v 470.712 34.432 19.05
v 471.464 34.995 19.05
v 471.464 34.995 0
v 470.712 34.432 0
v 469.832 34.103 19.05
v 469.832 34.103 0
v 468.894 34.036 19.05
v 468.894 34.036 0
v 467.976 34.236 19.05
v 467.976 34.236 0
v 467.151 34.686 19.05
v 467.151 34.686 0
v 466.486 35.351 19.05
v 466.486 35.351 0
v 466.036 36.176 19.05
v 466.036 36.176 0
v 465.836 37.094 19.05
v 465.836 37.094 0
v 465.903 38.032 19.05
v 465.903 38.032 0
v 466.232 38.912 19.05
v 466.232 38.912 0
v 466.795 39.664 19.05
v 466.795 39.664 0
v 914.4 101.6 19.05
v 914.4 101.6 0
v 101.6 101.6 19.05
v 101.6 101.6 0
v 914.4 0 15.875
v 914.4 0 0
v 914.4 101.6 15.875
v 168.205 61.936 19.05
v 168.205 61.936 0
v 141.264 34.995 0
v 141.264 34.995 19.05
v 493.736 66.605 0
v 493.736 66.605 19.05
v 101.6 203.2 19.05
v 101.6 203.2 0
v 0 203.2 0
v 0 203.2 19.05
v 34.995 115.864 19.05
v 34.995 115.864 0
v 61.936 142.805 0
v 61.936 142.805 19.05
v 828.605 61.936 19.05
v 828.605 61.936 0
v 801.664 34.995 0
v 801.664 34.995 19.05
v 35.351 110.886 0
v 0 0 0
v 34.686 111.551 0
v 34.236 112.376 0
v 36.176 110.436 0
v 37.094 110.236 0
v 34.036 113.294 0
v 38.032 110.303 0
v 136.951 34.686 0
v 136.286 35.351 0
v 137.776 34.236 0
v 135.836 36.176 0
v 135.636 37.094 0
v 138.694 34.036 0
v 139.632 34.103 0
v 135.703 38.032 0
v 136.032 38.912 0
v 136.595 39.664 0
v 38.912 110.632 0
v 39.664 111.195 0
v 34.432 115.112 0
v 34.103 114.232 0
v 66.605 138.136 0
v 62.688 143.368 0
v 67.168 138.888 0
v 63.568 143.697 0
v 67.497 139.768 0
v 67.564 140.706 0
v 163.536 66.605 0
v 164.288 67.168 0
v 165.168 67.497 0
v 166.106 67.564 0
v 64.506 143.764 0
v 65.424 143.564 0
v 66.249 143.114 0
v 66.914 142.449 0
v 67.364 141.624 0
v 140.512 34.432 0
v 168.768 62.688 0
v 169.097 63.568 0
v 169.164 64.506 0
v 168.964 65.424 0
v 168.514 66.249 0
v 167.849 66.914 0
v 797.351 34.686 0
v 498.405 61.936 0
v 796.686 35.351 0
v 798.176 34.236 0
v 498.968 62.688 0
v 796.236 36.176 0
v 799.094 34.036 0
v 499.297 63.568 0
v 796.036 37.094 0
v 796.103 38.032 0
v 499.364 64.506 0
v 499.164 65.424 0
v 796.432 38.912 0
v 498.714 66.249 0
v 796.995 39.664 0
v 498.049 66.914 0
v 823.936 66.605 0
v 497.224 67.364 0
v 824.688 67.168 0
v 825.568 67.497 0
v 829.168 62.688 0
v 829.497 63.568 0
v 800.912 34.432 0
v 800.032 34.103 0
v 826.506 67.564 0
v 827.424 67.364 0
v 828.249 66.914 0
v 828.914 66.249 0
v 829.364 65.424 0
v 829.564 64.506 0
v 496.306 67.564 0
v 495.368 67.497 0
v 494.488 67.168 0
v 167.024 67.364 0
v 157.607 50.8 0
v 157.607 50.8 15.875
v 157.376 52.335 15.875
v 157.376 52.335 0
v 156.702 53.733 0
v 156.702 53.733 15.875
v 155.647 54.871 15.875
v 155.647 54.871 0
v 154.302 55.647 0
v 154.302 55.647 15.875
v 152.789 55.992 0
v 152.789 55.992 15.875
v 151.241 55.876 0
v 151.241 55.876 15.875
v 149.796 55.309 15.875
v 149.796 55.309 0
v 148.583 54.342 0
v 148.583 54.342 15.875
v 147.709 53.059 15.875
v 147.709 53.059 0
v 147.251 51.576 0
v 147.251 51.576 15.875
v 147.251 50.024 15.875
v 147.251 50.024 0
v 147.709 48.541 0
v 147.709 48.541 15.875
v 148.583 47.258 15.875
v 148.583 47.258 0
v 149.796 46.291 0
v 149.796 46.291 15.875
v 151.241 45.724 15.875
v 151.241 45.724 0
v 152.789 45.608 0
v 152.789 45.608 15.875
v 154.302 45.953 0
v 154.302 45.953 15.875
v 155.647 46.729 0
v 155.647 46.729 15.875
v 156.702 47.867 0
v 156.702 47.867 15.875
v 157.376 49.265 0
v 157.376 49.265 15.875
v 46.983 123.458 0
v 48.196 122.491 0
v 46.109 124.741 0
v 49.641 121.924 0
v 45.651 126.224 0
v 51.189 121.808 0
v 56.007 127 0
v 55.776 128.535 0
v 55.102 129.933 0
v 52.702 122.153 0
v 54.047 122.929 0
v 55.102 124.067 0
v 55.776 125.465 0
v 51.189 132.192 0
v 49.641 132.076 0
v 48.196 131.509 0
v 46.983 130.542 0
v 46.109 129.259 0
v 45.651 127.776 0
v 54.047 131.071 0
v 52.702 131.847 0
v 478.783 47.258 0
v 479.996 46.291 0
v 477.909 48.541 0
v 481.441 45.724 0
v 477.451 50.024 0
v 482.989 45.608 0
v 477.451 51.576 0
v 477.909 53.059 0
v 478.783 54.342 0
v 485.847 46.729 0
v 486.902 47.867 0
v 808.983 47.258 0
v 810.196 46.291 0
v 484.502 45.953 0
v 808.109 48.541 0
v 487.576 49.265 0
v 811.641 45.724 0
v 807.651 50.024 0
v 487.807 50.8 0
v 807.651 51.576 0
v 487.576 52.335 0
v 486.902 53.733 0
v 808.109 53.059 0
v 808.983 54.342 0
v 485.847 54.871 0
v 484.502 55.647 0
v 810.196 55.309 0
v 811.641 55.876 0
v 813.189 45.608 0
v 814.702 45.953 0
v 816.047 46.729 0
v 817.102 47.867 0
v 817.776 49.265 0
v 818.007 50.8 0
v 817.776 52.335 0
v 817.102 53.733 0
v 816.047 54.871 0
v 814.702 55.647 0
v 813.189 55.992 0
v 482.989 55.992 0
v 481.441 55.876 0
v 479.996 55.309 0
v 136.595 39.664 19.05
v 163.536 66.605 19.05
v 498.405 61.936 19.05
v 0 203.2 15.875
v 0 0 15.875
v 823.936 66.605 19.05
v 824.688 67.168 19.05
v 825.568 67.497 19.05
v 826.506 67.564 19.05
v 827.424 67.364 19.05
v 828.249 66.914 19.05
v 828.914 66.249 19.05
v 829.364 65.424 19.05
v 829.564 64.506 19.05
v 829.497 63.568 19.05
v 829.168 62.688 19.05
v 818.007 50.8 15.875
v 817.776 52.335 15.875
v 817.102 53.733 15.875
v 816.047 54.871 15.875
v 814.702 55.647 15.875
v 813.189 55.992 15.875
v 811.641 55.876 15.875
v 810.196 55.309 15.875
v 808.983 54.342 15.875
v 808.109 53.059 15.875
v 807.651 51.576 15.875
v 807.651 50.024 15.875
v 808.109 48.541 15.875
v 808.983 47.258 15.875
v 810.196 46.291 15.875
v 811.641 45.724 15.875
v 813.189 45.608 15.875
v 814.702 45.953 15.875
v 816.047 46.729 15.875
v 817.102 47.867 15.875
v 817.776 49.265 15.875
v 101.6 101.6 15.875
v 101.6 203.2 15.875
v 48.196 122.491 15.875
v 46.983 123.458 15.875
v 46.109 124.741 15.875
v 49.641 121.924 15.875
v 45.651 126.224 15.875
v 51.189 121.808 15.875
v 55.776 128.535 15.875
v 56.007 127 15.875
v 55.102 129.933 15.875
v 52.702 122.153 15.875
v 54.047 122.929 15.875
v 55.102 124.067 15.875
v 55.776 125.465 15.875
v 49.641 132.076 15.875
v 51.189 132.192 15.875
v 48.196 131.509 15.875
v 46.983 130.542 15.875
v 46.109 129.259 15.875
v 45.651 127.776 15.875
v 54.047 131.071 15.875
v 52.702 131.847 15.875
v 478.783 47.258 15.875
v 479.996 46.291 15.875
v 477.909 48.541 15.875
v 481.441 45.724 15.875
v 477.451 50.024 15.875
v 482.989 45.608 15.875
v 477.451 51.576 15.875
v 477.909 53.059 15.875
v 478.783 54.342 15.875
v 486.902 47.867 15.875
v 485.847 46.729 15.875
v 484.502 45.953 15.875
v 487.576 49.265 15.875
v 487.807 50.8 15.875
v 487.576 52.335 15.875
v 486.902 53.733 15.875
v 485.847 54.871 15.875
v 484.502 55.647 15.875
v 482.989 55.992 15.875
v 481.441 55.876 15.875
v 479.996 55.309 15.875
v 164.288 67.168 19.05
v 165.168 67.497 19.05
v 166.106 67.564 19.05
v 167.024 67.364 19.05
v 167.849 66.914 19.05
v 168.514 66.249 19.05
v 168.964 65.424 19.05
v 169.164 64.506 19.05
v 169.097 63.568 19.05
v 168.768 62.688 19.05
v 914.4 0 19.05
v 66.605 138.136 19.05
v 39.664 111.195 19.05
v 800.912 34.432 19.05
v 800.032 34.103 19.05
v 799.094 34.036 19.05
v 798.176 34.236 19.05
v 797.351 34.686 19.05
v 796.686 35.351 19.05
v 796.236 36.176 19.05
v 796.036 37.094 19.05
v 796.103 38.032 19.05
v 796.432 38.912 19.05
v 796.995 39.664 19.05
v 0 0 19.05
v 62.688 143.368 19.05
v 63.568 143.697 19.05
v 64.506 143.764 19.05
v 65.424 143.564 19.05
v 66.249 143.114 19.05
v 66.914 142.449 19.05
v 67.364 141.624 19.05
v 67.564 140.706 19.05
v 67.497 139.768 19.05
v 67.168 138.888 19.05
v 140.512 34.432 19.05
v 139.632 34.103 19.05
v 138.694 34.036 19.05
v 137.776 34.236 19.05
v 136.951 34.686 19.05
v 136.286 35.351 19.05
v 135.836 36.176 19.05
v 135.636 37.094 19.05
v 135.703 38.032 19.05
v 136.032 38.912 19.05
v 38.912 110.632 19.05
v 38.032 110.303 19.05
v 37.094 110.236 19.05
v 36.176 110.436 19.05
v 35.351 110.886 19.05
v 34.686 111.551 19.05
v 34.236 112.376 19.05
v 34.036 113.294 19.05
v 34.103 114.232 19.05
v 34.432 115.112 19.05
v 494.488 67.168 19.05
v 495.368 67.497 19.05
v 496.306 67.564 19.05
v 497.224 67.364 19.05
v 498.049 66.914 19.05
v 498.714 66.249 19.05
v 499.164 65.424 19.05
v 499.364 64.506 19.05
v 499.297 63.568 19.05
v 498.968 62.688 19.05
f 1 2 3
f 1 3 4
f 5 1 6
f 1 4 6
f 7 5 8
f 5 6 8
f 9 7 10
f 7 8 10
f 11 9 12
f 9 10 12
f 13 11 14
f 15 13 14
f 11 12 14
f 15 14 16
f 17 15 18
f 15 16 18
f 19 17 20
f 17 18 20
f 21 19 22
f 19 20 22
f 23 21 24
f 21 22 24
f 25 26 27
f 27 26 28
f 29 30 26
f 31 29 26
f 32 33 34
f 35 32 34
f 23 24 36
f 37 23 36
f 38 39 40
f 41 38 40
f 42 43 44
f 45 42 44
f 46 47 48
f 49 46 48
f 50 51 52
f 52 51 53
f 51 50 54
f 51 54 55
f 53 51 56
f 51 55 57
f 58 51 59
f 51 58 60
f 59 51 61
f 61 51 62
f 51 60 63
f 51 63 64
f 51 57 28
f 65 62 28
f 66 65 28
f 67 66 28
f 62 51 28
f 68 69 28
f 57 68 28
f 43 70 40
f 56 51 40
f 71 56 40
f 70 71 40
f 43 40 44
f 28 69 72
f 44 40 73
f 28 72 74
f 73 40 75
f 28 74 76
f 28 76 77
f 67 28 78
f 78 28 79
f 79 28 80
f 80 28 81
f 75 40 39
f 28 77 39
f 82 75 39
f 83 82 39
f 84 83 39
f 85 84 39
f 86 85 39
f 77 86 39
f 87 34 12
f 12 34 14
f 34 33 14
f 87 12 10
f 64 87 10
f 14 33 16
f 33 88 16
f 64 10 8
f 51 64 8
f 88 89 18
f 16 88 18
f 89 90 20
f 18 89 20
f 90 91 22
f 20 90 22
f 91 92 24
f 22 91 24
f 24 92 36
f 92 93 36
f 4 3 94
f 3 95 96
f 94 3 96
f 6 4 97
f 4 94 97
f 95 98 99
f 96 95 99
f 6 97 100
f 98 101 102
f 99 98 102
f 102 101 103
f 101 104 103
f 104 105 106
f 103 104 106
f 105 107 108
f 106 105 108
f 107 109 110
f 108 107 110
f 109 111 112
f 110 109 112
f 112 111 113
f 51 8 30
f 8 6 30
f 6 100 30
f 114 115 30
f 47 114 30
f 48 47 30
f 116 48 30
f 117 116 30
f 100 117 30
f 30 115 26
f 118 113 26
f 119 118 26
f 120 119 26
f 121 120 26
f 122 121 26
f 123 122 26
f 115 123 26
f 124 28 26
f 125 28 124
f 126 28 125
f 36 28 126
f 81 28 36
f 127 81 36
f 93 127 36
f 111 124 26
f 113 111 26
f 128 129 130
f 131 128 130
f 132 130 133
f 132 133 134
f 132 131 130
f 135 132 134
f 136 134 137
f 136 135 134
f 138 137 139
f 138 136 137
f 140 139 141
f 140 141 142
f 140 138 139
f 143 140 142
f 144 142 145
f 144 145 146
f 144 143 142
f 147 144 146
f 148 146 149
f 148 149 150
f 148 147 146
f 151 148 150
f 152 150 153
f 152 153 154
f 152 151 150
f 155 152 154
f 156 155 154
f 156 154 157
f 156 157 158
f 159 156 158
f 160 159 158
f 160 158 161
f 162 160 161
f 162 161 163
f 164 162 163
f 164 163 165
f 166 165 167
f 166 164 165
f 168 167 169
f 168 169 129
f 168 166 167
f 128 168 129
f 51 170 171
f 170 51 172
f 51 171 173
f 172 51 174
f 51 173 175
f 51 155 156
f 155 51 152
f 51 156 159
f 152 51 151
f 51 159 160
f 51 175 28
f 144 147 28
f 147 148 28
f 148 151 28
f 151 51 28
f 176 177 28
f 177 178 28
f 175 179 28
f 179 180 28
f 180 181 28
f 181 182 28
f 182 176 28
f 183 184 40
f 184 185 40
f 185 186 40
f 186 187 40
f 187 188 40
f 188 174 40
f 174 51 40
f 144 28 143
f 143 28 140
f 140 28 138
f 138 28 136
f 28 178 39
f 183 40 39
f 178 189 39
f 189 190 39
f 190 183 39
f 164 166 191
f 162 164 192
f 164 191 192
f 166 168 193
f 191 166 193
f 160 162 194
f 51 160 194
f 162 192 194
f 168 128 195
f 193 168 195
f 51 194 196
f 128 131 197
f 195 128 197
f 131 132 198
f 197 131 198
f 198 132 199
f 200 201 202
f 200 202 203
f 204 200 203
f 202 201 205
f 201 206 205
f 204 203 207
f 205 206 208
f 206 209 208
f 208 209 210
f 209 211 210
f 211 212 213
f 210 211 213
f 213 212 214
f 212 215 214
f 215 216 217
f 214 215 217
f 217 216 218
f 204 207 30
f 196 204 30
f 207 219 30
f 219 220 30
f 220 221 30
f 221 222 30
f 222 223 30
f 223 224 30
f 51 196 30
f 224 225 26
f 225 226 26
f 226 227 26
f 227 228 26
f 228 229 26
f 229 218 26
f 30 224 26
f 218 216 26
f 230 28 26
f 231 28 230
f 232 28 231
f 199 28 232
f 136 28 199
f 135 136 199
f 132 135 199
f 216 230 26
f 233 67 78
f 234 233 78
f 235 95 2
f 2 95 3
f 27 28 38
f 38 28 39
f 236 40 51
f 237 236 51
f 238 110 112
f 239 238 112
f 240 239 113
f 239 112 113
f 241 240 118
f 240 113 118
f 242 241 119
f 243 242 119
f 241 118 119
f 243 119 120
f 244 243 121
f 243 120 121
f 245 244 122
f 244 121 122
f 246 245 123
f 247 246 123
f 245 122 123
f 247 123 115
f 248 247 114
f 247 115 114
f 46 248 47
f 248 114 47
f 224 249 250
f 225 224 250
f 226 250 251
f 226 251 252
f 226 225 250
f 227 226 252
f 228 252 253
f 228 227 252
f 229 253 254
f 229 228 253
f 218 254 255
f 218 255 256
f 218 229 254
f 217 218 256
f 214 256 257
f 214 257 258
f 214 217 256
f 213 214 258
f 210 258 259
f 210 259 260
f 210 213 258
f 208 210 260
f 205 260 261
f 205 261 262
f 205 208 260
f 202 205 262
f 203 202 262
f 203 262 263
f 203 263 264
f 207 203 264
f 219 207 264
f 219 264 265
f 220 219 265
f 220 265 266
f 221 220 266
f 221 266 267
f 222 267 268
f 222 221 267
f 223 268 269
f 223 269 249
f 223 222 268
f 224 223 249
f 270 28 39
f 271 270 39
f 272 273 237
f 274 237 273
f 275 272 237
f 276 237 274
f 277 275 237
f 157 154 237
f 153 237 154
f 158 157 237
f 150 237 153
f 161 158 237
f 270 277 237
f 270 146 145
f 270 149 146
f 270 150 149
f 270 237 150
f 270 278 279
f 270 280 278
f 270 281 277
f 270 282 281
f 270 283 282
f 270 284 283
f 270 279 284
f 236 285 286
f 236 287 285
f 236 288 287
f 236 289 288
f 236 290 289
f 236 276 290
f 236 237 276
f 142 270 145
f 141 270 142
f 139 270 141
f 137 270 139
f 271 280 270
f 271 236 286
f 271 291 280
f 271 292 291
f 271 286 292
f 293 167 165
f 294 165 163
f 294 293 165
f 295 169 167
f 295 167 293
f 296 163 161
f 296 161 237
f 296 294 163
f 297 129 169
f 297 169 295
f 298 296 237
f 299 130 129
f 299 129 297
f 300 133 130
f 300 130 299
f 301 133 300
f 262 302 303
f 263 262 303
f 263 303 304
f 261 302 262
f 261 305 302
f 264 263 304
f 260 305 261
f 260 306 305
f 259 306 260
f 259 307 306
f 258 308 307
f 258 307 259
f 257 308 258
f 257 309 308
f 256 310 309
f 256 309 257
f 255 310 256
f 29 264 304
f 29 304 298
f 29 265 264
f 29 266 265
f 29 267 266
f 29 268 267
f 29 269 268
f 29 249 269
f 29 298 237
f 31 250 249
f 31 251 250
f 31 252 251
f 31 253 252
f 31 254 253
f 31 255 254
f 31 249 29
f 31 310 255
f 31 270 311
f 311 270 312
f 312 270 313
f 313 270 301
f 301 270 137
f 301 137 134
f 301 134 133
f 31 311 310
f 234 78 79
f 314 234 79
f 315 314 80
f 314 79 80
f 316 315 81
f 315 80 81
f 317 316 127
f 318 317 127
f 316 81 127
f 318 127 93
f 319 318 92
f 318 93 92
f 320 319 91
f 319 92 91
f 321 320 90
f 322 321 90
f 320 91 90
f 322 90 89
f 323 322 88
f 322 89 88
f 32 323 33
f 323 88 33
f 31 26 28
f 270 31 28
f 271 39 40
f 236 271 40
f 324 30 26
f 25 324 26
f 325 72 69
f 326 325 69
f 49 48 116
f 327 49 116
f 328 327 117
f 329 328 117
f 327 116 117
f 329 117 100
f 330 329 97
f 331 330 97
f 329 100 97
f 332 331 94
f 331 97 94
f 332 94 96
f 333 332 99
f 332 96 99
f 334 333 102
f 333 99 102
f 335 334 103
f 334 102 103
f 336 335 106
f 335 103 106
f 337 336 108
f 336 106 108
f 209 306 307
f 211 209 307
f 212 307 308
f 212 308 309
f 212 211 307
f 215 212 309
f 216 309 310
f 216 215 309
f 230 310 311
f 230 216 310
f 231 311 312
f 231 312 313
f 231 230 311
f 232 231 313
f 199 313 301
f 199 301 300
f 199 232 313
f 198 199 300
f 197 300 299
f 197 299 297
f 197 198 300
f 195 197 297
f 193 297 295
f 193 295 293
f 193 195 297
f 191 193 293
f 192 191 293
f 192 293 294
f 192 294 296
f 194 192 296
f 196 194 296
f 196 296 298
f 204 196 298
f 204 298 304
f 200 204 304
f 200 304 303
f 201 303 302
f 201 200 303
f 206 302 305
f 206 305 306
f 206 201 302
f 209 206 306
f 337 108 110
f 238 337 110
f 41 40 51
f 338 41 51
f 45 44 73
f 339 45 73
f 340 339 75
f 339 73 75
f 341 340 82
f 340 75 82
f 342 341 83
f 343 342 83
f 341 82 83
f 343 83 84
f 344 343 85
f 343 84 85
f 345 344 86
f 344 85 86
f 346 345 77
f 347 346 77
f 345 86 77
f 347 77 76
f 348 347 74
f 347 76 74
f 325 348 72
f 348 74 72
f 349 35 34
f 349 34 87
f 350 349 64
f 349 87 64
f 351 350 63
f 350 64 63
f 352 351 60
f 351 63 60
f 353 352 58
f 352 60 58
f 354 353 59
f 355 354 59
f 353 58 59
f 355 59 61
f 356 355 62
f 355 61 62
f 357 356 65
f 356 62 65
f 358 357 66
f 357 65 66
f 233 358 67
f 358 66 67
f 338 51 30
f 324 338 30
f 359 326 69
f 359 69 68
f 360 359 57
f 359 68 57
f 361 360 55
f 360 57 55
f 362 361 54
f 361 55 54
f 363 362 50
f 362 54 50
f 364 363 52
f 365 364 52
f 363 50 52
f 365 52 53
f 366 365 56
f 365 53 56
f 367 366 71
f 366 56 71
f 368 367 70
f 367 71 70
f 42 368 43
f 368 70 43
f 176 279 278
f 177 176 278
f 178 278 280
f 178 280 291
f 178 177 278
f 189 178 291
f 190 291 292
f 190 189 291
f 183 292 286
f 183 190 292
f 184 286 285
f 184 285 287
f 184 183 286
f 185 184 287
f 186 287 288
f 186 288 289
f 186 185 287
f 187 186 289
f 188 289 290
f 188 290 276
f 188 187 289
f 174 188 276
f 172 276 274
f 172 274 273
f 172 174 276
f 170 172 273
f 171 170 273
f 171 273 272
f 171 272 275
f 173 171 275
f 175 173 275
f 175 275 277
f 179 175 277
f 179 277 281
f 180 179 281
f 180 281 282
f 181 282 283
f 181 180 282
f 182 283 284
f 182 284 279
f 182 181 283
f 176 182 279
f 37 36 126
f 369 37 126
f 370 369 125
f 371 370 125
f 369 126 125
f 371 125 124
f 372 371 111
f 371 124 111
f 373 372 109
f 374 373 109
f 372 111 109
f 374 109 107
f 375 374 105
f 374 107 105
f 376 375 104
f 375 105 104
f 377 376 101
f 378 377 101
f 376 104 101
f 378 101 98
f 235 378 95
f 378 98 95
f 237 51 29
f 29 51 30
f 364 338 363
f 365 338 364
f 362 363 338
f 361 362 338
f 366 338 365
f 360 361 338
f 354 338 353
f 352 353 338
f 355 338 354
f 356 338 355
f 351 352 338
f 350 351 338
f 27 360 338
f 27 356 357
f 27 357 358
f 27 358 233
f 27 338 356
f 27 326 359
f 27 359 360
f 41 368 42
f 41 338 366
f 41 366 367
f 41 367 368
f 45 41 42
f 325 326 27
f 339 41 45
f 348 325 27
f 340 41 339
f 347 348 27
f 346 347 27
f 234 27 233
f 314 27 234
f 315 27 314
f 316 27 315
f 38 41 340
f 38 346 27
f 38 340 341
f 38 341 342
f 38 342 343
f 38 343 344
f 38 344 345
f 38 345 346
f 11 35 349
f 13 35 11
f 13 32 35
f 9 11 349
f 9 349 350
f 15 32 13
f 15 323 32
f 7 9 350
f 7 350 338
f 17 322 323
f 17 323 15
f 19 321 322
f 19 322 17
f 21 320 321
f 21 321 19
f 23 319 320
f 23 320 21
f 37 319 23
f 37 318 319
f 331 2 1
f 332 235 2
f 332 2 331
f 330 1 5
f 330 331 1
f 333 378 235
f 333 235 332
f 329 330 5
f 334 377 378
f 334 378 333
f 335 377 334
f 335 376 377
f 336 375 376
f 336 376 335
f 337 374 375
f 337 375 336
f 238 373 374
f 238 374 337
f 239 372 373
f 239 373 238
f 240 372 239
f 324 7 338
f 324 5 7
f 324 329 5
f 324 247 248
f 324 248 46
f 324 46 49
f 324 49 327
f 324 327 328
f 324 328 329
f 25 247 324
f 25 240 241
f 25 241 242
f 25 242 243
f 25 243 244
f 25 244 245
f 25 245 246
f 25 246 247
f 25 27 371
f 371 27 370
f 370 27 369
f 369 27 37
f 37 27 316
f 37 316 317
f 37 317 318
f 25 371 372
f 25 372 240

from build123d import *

# Parameters (mm, degrees)
F2_DEPTH = 19.05
F0_R     = 5.207
F3_DEPTH = 15.875


# Not quite as in the source:
# - a length typed as a fraction of an inch, garbled in the dataset ("3 / 203.2 mm" for 3/8 in), is restored


with BuildPart() as f2:
    # F1 (on face) → F2 (new body)
    with BuildSketch(Plane.XY):
        Polygon((101.6, 203.2), (0, 203.2), (0, 0), (914.4, 0), (914.4, 101.6), (101.6, 101.6), align=None)
        with BuildLine():
            Line((168.2052507731, 61.9355175901), (141.2644824099, 34.9947492269))
            ThreePointArc((141.2644824099, 34.9947492269), (136.5947492269, 34.9947492269), (136.5947492269, 39.6644824099))
            Line((136.5947492269, 39.6644824099), (163.5355175901, 66.6052507731))
            ThreePointArc((163.5355175901, 66.6052507731), (168.2052507731, 66.6052507731), (168.2052507731, 61.9355175901))
        make_face(mode=Mode.SUBTRACT)
        with BuildLine():
            Line((498.4052507731, 61.9355175901), (471.4644824099, 34.9947492269))
            ThreePointArc((471.4644824099, 34.9947492269), (466.7947492269, 34.9947492269), (466.7947492269, 39.6644824099))
            Line((466.7947492269, 39.6644824099), (493.7355175901, 66.6052507731))
            ThreePointArc((493.7355175901, 66.6052507731), (498.4052507731, 66.6052507731), (498.4052507731, 61.9355175901))
        make_face(mode=Mode.SUBTRACT)
        with BuildLine():
            Line((828.6052507731, 61.9355175901), (801.6644824099, 34.9947492269))
            ThreePointArc((801.6644824099, 34.9947492269), (796.9947492269, 34.9947492269), (796.9947492269, 39.6644824099))
            Line((796.9947492269, 39.6644824099), (823.9355175901, 66.6052507731))
            ThreePointArc((823.9355175901, 66.6052507731), (828.6052507731, 66.6052507731), (828.6052507731, 61.9355175901))
        make_face(mode=Mode.SUBTRACT)
        with BuildLine():
            Line((66.6052507731, 138.1355175901), (39.6644824099, 111.1947492269))
            ThreePointArc((39.6644824099, 111.1947492269), (34.9947492269, 111.1947492269), (34.9947492269, 115.8644824099))
            Line((34.9947492269, 115.8644824099), (61.9355175901, 142.8052507731))
            ThreePointArc((61.9355175901, 142.8052507731), (66.6052507731, 142.8052507731), (66.6052507731, 138.1355175901))
        make_face(mode=Mode.SUBTRACT)
    extrude(amount=F2_DEPTH)


with BuildPart() as f3:
    # F0 (on Top) → F3 (new body)
    with BuildSketch(Plane.XY):
        Polygon((101.6, 203.2), (0, 203.2), (0, 0), (914.4, 0), (914.4, 101.6), (101.6, 101.6), align=None)
        with Locations((152.4, 50.8)):
            Circle(F0_R, mode=Mode.SUBTRACT)
        with Locations((482.6, 50.8)):
            Circle(F0_R, mode=Mode.SUBTRACT)
        with Locations((812.8, 50.8)):
            Circle(F0_R, mode=Mode.SUBTRACT)
        with Locations((50.8, 127)):
            Circle(F0_R, mode=Mode.SUBTRACT)
    extrude(amount=F3_DEPTH)


solid = Compound([f2.part, f3.part])
